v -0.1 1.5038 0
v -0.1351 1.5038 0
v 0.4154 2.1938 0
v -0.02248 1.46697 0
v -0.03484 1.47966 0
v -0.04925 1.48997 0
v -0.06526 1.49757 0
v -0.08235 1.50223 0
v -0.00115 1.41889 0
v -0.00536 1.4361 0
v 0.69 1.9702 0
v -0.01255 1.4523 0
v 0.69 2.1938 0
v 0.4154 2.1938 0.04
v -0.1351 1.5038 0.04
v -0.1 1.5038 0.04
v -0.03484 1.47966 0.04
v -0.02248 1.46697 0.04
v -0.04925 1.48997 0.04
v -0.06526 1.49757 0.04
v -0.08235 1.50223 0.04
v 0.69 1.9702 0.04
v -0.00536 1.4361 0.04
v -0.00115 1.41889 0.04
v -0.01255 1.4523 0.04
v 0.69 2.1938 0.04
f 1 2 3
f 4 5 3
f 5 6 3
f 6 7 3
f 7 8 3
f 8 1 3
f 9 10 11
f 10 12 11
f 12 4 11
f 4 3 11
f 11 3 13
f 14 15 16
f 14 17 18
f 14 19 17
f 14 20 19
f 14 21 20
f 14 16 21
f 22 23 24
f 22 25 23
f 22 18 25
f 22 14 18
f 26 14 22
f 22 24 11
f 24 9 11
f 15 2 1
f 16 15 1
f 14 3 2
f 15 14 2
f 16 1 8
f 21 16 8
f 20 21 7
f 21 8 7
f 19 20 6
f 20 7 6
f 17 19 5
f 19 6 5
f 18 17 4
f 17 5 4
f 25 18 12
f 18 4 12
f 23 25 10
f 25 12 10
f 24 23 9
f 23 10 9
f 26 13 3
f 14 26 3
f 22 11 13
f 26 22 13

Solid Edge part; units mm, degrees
sketch "Sketch1" plane through (0, 0, 0) normal (0, 0, 1) x (1, 0, 0)
  line L0 (-0.0011, 1.4189) -> (0.69, 1.9702)
  line L1 (0.69, 1.9702) -> (0.69, 2.1938)
  line L2 (0.69, 2.1938) -> (0.4154, 2.1938)
  line L3 (0.4154, 2.1938) -> (-0.1351, 1.5038)
  line L4 (-0.1351, 1.5038) -> (-0.1, 1.5038)
  arc A0 (-0.0011, 1.4189) -> (-0.1, 1.5038) centre (-0.1, 1.4038) ccw
extrude "Protrusion1" add sketch "Sketch1" along normal blind 0.04
